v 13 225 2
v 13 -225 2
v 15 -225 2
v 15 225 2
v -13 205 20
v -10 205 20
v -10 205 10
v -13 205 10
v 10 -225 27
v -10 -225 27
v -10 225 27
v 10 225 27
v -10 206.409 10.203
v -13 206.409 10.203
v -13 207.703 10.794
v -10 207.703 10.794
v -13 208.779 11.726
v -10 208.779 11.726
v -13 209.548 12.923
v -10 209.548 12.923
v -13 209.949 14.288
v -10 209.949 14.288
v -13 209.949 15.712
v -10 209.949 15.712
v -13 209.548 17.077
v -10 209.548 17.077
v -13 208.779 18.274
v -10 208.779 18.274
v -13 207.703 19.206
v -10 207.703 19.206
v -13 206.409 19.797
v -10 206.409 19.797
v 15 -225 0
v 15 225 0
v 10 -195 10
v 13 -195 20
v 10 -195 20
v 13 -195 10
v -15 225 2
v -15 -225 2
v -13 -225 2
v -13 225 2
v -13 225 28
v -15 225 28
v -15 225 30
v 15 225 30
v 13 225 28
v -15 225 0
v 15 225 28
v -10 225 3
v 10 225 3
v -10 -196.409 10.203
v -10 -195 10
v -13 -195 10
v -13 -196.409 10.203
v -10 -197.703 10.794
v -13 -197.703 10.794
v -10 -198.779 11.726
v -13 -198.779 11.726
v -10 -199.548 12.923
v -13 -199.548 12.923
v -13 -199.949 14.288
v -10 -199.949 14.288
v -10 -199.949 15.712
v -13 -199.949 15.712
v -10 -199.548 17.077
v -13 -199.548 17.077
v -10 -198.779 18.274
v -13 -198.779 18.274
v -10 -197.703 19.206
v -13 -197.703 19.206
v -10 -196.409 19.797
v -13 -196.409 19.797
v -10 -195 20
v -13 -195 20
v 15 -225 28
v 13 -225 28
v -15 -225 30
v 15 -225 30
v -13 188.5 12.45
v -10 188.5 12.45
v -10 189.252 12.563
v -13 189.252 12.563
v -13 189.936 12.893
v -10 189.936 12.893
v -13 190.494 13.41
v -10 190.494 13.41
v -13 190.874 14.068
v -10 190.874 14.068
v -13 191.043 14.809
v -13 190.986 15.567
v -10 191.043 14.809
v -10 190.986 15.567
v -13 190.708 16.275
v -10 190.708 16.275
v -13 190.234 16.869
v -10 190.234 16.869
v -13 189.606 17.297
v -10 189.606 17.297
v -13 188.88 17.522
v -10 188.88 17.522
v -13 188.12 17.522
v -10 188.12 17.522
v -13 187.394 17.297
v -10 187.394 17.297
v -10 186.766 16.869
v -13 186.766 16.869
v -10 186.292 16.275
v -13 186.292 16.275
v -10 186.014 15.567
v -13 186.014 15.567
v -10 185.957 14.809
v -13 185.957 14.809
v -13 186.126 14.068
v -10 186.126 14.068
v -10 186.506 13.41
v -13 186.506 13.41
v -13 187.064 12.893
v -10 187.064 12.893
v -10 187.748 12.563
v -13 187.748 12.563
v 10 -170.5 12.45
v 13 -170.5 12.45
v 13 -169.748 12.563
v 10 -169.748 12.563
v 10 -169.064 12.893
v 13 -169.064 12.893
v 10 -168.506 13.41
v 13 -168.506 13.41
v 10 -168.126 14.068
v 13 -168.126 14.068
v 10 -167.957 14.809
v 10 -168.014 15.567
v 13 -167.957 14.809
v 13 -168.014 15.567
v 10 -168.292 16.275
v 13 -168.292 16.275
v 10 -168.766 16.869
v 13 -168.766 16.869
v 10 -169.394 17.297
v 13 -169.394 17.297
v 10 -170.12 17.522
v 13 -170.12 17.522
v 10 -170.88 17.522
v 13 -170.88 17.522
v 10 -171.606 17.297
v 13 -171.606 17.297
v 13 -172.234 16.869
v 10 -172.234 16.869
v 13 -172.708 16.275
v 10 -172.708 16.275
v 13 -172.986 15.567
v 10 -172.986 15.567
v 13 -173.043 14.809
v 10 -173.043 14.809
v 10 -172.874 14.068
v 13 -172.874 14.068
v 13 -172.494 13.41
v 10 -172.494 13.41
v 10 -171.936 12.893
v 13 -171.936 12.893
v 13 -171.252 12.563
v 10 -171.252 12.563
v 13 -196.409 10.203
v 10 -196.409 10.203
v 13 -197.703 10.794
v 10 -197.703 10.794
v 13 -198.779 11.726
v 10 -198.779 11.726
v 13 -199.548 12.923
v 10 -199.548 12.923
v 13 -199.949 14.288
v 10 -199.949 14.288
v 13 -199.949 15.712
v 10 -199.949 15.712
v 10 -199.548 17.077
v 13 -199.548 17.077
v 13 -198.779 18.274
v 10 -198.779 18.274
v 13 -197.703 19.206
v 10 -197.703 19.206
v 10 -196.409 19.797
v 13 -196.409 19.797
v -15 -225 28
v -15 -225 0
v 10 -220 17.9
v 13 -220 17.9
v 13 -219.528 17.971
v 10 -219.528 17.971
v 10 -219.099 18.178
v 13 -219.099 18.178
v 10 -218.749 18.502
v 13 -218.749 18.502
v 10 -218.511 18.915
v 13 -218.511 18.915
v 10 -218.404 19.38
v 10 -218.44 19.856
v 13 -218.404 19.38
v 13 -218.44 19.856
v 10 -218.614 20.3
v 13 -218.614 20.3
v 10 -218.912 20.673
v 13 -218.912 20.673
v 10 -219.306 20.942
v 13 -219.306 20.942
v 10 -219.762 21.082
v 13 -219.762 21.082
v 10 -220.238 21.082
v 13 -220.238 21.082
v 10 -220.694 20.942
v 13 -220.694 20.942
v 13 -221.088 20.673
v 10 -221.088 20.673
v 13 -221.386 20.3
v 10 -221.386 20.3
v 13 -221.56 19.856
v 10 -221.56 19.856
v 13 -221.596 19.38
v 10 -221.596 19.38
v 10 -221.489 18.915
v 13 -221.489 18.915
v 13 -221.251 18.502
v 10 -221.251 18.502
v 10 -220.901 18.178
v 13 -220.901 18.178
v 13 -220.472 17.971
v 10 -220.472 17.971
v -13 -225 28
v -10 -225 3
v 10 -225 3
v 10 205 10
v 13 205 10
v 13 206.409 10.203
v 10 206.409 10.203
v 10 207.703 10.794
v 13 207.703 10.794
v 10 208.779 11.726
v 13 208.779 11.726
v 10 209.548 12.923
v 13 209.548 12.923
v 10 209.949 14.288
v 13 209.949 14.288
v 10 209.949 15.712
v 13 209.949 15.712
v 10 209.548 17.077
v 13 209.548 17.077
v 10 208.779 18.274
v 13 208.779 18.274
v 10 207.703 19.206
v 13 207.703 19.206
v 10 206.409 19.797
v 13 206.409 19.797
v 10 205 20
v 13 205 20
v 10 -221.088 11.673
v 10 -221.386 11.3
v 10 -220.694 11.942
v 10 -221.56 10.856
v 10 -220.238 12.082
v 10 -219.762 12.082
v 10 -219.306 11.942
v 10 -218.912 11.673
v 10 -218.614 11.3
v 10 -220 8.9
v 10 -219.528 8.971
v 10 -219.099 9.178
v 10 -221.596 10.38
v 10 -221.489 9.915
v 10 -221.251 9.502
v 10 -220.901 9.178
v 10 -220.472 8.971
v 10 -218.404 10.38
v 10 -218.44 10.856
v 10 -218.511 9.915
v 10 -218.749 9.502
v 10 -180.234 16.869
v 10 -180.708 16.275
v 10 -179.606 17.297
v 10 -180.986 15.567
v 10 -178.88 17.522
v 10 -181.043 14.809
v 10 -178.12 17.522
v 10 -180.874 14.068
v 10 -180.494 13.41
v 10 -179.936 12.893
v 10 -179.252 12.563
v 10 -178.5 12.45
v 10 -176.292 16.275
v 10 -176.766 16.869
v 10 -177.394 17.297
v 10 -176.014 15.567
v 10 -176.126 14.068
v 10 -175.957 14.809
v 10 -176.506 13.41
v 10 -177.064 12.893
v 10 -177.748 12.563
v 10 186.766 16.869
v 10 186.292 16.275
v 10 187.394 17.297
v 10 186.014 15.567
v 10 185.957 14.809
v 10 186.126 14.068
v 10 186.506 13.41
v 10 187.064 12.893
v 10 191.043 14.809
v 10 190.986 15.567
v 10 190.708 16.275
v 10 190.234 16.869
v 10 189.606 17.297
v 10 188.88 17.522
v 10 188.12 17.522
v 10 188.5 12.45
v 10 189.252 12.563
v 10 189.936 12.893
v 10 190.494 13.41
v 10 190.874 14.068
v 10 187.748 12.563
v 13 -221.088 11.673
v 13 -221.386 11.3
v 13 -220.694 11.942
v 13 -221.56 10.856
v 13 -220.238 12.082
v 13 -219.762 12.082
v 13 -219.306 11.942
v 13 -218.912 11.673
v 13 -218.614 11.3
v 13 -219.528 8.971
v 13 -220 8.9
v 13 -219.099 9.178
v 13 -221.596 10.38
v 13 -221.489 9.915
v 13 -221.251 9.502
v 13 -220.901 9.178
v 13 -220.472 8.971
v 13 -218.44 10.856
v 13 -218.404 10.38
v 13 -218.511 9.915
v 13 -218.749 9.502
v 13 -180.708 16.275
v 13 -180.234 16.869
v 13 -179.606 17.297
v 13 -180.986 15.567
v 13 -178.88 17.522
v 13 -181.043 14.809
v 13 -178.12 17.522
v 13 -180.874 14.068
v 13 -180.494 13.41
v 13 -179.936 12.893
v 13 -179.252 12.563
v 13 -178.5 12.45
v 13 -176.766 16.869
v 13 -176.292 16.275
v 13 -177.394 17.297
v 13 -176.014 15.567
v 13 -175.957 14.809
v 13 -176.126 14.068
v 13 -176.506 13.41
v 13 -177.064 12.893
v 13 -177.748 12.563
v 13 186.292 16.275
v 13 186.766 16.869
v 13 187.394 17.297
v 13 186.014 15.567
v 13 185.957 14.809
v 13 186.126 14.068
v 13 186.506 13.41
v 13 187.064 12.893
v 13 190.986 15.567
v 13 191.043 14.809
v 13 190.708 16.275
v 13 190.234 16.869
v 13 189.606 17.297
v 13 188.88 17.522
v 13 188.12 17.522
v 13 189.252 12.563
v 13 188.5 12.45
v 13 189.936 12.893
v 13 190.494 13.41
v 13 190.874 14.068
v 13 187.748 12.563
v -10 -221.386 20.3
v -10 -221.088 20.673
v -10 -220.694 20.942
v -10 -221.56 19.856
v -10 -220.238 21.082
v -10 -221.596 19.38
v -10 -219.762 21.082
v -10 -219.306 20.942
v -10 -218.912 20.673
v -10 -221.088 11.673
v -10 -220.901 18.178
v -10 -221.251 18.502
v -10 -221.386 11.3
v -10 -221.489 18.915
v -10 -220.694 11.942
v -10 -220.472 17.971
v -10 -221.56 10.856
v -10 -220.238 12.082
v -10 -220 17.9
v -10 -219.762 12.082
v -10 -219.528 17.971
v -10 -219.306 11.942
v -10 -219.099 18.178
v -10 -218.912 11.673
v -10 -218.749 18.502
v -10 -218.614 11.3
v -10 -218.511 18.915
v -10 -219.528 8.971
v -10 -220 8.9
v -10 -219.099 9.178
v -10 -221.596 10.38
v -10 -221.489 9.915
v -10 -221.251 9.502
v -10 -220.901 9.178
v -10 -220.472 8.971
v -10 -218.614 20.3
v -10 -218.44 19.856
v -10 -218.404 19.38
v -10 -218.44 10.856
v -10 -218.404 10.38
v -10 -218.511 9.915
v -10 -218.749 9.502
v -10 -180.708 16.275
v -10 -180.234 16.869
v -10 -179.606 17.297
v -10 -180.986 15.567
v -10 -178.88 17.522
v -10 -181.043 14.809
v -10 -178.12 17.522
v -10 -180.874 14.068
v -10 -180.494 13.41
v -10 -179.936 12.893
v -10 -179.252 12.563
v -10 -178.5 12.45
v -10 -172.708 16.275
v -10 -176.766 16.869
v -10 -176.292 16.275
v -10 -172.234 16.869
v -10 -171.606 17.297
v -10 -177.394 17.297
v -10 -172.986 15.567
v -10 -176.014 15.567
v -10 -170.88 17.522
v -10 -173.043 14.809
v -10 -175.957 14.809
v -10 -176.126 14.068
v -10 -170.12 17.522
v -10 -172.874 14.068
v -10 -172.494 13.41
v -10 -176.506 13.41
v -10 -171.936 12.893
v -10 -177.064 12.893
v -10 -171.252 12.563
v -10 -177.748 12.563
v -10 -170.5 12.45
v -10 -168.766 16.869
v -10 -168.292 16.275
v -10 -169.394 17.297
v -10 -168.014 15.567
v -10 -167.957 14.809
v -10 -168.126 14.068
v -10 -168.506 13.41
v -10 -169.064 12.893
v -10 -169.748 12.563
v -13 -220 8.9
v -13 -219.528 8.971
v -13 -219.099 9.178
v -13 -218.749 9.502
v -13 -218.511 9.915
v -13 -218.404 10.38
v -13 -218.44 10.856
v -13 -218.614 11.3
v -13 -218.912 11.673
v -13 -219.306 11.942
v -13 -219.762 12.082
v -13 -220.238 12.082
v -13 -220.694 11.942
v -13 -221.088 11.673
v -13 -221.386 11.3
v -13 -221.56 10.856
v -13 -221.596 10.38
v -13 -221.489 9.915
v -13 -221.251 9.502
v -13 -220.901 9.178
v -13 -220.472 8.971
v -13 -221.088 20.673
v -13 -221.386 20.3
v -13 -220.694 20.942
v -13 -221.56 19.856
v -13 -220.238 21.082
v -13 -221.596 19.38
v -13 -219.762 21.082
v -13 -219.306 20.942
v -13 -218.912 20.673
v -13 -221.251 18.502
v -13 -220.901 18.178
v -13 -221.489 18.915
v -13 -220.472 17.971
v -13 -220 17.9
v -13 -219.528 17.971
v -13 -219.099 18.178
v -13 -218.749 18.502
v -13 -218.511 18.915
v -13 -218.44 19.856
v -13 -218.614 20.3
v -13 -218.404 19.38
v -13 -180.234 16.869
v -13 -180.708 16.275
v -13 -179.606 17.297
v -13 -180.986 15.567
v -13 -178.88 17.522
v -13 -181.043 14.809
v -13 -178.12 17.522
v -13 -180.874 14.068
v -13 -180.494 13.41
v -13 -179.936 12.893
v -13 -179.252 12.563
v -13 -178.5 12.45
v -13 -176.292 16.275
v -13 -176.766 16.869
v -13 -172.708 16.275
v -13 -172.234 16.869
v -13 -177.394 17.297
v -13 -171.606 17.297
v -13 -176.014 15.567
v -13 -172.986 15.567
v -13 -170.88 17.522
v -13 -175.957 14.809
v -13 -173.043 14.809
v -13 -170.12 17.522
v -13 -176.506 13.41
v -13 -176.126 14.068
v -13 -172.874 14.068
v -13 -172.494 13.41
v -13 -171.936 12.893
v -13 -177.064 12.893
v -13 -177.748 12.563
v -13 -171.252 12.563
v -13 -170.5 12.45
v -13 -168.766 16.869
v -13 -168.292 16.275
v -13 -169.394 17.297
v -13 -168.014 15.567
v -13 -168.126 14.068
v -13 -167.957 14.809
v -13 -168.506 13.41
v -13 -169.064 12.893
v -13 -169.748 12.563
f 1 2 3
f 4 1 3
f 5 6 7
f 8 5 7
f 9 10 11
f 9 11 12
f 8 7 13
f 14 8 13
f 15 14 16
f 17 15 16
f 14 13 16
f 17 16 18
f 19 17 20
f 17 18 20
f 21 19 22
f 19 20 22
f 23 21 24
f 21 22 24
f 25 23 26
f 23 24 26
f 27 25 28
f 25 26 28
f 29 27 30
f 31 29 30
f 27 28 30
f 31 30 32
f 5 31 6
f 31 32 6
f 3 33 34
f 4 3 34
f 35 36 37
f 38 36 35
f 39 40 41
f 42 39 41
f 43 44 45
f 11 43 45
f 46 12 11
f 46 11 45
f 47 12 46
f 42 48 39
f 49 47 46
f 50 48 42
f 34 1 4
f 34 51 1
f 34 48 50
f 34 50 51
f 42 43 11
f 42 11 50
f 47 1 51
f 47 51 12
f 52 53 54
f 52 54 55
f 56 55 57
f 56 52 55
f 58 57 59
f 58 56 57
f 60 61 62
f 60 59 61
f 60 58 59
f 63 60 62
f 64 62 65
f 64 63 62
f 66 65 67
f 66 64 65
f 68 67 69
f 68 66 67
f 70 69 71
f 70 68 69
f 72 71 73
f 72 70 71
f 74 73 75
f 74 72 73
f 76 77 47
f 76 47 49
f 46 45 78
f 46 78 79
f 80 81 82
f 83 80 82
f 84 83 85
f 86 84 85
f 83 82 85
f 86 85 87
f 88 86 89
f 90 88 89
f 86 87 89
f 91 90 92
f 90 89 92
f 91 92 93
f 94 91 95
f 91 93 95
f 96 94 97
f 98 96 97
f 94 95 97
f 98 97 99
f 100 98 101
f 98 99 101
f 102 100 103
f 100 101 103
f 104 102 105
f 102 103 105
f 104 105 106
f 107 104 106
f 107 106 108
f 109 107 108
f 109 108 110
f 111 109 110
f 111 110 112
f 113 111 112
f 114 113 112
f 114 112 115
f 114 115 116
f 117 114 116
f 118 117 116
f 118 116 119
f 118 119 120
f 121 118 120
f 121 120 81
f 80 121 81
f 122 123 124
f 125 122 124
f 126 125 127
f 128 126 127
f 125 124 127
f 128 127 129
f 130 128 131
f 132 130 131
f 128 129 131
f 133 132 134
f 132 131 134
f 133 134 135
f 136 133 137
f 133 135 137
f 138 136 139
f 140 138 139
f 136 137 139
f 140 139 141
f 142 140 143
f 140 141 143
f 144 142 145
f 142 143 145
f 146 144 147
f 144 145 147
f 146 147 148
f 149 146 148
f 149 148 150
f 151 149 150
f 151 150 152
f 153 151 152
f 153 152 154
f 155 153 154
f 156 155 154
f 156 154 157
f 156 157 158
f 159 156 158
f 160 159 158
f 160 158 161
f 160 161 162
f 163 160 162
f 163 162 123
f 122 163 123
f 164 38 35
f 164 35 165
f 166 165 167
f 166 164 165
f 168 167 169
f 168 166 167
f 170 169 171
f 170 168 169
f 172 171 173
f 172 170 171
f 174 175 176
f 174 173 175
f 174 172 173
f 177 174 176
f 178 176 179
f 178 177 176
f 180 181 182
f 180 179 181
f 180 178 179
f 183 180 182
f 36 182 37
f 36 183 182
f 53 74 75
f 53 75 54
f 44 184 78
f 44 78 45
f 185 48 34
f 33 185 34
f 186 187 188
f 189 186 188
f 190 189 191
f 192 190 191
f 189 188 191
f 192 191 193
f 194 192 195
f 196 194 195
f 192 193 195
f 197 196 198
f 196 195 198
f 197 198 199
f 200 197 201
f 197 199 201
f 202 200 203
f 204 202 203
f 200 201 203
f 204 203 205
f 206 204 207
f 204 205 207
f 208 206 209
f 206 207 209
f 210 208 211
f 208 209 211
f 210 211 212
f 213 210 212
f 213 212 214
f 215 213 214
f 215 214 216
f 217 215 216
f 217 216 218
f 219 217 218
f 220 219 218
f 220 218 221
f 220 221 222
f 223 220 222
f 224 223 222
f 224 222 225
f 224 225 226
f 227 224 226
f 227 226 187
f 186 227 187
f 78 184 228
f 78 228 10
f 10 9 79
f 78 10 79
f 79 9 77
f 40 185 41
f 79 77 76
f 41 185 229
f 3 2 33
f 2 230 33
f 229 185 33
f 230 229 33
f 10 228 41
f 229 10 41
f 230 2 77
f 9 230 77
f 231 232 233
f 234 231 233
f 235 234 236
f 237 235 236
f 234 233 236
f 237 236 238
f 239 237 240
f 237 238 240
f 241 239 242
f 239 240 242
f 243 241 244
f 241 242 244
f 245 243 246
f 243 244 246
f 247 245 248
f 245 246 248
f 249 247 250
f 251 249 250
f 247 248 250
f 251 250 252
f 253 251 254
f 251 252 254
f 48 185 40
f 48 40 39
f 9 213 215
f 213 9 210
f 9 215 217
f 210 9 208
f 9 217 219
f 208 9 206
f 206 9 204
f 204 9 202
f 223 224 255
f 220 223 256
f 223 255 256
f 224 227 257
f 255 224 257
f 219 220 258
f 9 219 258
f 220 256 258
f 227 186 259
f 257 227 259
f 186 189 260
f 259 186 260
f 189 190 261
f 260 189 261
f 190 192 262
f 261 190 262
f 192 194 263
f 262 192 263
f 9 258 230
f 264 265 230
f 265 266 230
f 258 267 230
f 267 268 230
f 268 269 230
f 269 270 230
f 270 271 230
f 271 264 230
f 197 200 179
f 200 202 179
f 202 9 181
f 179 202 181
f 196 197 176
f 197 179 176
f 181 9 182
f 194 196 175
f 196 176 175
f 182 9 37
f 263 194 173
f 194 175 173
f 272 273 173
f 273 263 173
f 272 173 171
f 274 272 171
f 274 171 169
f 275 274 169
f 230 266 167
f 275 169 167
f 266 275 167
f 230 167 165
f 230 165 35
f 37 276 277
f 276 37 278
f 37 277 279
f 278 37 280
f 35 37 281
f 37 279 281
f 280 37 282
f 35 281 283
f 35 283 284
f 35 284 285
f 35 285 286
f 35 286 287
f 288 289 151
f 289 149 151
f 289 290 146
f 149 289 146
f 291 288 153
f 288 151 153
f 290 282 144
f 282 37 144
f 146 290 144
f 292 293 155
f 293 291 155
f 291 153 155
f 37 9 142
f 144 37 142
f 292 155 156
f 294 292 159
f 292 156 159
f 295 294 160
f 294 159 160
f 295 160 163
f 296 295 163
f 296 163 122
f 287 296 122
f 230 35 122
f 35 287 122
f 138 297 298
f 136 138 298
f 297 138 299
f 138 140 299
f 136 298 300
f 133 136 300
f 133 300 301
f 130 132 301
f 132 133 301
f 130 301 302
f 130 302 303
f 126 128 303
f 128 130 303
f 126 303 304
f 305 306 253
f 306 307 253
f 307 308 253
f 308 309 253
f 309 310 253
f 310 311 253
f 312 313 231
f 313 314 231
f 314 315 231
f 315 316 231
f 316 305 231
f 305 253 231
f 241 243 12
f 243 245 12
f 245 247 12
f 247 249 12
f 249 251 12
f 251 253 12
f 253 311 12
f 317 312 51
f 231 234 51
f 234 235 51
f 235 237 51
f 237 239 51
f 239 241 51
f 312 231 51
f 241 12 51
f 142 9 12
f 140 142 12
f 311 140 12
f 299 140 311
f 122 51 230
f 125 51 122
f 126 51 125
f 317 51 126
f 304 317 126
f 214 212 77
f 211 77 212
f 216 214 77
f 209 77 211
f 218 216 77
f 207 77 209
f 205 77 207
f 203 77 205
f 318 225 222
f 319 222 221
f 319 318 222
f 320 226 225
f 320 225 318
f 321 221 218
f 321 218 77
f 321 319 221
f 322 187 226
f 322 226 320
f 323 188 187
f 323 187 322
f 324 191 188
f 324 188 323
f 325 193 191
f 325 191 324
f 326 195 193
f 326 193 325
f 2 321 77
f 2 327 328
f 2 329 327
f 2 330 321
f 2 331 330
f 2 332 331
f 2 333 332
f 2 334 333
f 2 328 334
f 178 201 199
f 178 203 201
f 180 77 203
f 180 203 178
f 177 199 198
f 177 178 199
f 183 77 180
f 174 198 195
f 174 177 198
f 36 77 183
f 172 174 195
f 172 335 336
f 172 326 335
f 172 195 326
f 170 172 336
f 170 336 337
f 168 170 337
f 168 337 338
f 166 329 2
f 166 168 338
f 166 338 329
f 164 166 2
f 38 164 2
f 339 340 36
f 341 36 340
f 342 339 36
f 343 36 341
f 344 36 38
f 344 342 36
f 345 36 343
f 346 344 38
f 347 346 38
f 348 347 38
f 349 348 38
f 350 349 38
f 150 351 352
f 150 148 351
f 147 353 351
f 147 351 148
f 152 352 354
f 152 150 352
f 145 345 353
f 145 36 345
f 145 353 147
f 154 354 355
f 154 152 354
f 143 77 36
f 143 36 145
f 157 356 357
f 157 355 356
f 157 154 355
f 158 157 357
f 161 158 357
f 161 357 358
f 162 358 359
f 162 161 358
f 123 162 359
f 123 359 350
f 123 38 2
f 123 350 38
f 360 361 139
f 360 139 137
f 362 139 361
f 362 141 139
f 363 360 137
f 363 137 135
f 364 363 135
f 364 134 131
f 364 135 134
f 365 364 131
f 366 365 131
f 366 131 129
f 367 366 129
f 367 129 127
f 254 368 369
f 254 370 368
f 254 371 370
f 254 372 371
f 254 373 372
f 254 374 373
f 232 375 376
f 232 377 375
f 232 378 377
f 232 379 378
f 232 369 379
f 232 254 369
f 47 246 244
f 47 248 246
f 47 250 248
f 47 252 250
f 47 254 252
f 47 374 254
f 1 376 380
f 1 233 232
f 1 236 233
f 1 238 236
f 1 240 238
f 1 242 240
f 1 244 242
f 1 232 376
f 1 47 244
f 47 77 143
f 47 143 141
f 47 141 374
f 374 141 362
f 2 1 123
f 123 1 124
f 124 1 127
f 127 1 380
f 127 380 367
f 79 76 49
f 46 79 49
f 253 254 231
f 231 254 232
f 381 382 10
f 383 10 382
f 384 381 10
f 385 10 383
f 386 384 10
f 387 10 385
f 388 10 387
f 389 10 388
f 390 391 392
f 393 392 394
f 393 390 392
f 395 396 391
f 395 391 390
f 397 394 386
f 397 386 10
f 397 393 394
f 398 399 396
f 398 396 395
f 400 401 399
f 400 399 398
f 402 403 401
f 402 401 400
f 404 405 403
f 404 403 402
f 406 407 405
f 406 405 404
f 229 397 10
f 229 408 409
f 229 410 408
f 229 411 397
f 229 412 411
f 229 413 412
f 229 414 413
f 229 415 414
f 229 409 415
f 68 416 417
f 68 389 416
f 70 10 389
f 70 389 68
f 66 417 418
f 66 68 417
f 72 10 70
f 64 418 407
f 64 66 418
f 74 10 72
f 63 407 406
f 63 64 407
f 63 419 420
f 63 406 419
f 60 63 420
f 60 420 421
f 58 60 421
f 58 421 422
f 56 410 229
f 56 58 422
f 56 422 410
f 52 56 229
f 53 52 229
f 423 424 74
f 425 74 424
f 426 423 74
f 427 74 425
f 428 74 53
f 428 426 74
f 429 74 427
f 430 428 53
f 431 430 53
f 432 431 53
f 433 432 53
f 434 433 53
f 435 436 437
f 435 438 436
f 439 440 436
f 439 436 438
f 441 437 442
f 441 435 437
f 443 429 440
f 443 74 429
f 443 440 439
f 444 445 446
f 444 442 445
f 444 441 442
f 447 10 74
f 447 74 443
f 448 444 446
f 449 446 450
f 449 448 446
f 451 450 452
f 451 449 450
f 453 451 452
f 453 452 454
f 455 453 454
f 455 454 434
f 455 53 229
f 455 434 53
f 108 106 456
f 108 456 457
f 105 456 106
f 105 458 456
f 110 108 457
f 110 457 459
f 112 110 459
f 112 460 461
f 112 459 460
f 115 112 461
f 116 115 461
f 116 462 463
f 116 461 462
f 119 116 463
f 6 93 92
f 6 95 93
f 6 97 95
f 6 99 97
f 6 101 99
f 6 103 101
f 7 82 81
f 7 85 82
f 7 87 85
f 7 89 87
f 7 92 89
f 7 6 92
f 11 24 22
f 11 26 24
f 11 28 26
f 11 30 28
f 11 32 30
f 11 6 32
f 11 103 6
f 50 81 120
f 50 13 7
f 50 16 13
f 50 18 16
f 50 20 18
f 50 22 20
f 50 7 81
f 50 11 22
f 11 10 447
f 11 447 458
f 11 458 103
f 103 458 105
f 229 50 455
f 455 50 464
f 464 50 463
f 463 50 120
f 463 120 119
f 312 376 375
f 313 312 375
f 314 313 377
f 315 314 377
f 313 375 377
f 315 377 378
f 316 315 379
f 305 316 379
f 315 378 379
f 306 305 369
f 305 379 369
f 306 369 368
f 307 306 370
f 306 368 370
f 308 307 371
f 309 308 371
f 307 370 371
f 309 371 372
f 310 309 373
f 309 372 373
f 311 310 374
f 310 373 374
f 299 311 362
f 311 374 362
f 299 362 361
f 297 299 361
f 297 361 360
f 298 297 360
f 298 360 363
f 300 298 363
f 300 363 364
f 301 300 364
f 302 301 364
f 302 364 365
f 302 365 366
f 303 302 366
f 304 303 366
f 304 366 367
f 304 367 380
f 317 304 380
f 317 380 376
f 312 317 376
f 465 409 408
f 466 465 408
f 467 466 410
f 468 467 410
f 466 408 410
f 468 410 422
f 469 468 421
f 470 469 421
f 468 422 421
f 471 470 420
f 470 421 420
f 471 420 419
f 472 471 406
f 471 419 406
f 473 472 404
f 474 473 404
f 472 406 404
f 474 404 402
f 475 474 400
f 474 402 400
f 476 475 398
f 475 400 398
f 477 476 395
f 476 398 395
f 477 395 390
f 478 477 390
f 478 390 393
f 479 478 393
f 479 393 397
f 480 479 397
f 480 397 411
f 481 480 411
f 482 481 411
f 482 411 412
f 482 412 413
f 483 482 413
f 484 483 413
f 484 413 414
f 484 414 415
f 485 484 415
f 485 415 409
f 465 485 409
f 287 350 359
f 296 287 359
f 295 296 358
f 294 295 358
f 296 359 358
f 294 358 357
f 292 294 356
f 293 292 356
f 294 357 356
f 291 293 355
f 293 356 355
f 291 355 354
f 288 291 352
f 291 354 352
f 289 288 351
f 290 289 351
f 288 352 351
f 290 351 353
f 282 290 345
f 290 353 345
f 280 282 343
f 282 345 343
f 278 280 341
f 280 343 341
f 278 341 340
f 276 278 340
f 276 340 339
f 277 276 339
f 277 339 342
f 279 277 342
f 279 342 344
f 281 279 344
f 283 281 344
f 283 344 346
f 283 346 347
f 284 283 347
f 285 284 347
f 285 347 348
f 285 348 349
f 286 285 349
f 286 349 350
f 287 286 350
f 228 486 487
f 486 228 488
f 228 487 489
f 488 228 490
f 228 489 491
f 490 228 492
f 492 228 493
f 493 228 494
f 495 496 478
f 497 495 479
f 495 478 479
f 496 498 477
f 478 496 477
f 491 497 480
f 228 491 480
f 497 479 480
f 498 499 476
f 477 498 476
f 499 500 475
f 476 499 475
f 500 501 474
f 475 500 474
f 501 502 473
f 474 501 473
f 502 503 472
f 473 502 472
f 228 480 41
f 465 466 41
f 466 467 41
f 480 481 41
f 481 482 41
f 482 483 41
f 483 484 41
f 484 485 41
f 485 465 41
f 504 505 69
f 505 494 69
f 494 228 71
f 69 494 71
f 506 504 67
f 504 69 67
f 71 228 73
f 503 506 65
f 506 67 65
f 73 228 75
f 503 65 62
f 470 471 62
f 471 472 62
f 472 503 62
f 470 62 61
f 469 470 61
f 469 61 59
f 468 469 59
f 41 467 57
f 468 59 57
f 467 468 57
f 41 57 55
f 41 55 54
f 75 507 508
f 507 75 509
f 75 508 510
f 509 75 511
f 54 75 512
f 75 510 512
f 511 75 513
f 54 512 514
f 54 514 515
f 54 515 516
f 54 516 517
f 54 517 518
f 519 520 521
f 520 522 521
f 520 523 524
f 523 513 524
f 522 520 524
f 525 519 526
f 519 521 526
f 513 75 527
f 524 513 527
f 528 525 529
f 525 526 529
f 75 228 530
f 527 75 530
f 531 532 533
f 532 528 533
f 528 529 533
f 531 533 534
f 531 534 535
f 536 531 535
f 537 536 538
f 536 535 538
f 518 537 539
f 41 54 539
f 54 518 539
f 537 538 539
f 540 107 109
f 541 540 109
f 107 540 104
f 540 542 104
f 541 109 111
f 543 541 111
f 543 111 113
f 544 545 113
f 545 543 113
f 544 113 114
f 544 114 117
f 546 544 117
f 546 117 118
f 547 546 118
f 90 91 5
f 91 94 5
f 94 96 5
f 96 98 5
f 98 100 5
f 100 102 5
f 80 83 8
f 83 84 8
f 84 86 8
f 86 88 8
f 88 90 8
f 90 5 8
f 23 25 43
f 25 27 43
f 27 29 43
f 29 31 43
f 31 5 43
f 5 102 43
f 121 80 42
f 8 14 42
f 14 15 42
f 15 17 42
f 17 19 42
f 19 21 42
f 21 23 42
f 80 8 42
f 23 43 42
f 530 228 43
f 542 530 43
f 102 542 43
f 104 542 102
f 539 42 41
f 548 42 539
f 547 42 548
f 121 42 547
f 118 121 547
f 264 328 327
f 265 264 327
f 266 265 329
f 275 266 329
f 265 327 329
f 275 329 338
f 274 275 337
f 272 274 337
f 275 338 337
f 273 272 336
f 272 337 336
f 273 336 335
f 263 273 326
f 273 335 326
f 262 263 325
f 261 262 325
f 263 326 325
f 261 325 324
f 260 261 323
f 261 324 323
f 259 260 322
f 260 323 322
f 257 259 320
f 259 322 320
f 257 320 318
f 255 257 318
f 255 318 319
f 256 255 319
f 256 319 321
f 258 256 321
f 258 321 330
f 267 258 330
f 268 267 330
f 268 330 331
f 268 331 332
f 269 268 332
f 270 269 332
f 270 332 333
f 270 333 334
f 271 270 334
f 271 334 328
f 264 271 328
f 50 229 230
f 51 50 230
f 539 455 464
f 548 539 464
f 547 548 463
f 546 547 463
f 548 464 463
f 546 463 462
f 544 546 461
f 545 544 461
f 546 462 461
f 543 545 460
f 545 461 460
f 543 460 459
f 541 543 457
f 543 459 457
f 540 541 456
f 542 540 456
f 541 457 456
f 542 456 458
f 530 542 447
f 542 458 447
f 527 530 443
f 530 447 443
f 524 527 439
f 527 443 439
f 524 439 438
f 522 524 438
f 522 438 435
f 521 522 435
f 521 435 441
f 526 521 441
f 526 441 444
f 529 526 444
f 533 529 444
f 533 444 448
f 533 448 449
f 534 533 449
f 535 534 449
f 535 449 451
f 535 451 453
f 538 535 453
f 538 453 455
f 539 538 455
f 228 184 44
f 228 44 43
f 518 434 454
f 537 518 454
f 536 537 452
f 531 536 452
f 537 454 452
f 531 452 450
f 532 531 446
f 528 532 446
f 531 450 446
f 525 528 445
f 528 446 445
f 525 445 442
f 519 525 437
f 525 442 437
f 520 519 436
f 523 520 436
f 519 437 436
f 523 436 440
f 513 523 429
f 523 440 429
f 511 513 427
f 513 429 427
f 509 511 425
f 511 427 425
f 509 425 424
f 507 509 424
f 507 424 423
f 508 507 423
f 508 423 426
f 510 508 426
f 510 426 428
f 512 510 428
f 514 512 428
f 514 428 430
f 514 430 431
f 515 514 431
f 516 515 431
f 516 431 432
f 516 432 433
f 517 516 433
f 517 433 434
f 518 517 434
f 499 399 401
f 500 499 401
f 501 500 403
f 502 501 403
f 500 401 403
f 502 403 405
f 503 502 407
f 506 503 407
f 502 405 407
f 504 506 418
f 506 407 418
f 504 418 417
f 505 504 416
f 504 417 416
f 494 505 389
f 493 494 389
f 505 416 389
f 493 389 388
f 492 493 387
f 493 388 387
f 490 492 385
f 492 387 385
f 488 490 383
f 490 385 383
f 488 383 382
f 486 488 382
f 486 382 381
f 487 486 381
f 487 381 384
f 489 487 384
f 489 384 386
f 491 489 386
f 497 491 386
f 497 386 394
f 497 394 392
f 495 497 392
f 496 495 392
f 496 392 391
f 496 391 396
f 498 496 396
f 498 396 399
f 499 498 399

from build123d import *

# Parameters (mm, degrees)
SKETCH_1_W          = 30
SKETCH_1_H          = 450
EXTRUDE_1_DEPTH     = 30
SKETCH_2_W          = 2
SKETCH_2_H          = 26
CUT_EXTRUDE_1_DEPTH = 452.248268695
SHELL_1_T           = -3
SKETCH_3_R          = 2.55
SKETCH_3_R_2        = 1.6
CUT_EXTRUDE_2_DEPTH = 229.7116088


with BuildPart() as part:
    # 草图1 → 凸台-拉伸1 (new body)
    with BuildSketch(Plane.XY):
        Rectangle(SKETCH_1_W, SKETCH_1_H)
    extrude(amount=EXTRUDE_1_DEPTH)

    # 草图2 → 切除-拉伸1 (cut, through all)
    with BuildSketch(Plane(origin=(0, 225, 0), x_dir=(1, 0, 0), z_dir=(0, 1, 0))):
        with Locations((-14, -15)):
            Rectangle(SKETCH_2_W, SKETCH_2_H)
        with Locations((14, -15)):
            Rectangle(SKETCH_2_W, SKETCH_2_H)
    extrude(amount=-CUT_EXTRUDE_1_DEPTH, mode=Mode.SUBTRACT)

    # 抽壳1
    shell_1_openings = [part.faces().sort_by_distance(p)[0] for p in [
        (0, 225, 15),
        (0, -225, 15),
    ]]
    offset(amount=SHELL_1_T, openings=shell_1_openings)

    # 草图3 → 切除-拉伸2 (cut, through all)
    with BuildSketch(Plane(origin=(13, 0, 0), x_dir=(0, 0, -1), z_dir=(1, 0, 0))):
        with Locations((-15, 188.5)):
            Circle(SKETCH_3_R)
        with Locations((-15, -178.5)):
            Circle(SKETCH_3_R)
        with Locations((-19.5, -220)):
            Circle(SKETCH_3_R_2)
        with Locations((-15, -170.5)):
            Circle(SKETCH_3_R)
        with Locations((-10.5, -220)):
            Circle(SKETCH_3_R_2)
        with BuildLine():
            Line((-20, 205), (-10, 205))
            ThreePointArc((-10, 205), (-15, 210), (-20, 205))
        make_face()
        with BuildLine():
            Line((-20, -195), (-10, -195))
            ThreePointArc((-10, -195), (-15, -200), (-20, -195))
        make_face()
    extrude(amount=-CUT_EXTRUDE_2_DEPTH, mode=Mode.SUBTRACT)


solid = part.part
